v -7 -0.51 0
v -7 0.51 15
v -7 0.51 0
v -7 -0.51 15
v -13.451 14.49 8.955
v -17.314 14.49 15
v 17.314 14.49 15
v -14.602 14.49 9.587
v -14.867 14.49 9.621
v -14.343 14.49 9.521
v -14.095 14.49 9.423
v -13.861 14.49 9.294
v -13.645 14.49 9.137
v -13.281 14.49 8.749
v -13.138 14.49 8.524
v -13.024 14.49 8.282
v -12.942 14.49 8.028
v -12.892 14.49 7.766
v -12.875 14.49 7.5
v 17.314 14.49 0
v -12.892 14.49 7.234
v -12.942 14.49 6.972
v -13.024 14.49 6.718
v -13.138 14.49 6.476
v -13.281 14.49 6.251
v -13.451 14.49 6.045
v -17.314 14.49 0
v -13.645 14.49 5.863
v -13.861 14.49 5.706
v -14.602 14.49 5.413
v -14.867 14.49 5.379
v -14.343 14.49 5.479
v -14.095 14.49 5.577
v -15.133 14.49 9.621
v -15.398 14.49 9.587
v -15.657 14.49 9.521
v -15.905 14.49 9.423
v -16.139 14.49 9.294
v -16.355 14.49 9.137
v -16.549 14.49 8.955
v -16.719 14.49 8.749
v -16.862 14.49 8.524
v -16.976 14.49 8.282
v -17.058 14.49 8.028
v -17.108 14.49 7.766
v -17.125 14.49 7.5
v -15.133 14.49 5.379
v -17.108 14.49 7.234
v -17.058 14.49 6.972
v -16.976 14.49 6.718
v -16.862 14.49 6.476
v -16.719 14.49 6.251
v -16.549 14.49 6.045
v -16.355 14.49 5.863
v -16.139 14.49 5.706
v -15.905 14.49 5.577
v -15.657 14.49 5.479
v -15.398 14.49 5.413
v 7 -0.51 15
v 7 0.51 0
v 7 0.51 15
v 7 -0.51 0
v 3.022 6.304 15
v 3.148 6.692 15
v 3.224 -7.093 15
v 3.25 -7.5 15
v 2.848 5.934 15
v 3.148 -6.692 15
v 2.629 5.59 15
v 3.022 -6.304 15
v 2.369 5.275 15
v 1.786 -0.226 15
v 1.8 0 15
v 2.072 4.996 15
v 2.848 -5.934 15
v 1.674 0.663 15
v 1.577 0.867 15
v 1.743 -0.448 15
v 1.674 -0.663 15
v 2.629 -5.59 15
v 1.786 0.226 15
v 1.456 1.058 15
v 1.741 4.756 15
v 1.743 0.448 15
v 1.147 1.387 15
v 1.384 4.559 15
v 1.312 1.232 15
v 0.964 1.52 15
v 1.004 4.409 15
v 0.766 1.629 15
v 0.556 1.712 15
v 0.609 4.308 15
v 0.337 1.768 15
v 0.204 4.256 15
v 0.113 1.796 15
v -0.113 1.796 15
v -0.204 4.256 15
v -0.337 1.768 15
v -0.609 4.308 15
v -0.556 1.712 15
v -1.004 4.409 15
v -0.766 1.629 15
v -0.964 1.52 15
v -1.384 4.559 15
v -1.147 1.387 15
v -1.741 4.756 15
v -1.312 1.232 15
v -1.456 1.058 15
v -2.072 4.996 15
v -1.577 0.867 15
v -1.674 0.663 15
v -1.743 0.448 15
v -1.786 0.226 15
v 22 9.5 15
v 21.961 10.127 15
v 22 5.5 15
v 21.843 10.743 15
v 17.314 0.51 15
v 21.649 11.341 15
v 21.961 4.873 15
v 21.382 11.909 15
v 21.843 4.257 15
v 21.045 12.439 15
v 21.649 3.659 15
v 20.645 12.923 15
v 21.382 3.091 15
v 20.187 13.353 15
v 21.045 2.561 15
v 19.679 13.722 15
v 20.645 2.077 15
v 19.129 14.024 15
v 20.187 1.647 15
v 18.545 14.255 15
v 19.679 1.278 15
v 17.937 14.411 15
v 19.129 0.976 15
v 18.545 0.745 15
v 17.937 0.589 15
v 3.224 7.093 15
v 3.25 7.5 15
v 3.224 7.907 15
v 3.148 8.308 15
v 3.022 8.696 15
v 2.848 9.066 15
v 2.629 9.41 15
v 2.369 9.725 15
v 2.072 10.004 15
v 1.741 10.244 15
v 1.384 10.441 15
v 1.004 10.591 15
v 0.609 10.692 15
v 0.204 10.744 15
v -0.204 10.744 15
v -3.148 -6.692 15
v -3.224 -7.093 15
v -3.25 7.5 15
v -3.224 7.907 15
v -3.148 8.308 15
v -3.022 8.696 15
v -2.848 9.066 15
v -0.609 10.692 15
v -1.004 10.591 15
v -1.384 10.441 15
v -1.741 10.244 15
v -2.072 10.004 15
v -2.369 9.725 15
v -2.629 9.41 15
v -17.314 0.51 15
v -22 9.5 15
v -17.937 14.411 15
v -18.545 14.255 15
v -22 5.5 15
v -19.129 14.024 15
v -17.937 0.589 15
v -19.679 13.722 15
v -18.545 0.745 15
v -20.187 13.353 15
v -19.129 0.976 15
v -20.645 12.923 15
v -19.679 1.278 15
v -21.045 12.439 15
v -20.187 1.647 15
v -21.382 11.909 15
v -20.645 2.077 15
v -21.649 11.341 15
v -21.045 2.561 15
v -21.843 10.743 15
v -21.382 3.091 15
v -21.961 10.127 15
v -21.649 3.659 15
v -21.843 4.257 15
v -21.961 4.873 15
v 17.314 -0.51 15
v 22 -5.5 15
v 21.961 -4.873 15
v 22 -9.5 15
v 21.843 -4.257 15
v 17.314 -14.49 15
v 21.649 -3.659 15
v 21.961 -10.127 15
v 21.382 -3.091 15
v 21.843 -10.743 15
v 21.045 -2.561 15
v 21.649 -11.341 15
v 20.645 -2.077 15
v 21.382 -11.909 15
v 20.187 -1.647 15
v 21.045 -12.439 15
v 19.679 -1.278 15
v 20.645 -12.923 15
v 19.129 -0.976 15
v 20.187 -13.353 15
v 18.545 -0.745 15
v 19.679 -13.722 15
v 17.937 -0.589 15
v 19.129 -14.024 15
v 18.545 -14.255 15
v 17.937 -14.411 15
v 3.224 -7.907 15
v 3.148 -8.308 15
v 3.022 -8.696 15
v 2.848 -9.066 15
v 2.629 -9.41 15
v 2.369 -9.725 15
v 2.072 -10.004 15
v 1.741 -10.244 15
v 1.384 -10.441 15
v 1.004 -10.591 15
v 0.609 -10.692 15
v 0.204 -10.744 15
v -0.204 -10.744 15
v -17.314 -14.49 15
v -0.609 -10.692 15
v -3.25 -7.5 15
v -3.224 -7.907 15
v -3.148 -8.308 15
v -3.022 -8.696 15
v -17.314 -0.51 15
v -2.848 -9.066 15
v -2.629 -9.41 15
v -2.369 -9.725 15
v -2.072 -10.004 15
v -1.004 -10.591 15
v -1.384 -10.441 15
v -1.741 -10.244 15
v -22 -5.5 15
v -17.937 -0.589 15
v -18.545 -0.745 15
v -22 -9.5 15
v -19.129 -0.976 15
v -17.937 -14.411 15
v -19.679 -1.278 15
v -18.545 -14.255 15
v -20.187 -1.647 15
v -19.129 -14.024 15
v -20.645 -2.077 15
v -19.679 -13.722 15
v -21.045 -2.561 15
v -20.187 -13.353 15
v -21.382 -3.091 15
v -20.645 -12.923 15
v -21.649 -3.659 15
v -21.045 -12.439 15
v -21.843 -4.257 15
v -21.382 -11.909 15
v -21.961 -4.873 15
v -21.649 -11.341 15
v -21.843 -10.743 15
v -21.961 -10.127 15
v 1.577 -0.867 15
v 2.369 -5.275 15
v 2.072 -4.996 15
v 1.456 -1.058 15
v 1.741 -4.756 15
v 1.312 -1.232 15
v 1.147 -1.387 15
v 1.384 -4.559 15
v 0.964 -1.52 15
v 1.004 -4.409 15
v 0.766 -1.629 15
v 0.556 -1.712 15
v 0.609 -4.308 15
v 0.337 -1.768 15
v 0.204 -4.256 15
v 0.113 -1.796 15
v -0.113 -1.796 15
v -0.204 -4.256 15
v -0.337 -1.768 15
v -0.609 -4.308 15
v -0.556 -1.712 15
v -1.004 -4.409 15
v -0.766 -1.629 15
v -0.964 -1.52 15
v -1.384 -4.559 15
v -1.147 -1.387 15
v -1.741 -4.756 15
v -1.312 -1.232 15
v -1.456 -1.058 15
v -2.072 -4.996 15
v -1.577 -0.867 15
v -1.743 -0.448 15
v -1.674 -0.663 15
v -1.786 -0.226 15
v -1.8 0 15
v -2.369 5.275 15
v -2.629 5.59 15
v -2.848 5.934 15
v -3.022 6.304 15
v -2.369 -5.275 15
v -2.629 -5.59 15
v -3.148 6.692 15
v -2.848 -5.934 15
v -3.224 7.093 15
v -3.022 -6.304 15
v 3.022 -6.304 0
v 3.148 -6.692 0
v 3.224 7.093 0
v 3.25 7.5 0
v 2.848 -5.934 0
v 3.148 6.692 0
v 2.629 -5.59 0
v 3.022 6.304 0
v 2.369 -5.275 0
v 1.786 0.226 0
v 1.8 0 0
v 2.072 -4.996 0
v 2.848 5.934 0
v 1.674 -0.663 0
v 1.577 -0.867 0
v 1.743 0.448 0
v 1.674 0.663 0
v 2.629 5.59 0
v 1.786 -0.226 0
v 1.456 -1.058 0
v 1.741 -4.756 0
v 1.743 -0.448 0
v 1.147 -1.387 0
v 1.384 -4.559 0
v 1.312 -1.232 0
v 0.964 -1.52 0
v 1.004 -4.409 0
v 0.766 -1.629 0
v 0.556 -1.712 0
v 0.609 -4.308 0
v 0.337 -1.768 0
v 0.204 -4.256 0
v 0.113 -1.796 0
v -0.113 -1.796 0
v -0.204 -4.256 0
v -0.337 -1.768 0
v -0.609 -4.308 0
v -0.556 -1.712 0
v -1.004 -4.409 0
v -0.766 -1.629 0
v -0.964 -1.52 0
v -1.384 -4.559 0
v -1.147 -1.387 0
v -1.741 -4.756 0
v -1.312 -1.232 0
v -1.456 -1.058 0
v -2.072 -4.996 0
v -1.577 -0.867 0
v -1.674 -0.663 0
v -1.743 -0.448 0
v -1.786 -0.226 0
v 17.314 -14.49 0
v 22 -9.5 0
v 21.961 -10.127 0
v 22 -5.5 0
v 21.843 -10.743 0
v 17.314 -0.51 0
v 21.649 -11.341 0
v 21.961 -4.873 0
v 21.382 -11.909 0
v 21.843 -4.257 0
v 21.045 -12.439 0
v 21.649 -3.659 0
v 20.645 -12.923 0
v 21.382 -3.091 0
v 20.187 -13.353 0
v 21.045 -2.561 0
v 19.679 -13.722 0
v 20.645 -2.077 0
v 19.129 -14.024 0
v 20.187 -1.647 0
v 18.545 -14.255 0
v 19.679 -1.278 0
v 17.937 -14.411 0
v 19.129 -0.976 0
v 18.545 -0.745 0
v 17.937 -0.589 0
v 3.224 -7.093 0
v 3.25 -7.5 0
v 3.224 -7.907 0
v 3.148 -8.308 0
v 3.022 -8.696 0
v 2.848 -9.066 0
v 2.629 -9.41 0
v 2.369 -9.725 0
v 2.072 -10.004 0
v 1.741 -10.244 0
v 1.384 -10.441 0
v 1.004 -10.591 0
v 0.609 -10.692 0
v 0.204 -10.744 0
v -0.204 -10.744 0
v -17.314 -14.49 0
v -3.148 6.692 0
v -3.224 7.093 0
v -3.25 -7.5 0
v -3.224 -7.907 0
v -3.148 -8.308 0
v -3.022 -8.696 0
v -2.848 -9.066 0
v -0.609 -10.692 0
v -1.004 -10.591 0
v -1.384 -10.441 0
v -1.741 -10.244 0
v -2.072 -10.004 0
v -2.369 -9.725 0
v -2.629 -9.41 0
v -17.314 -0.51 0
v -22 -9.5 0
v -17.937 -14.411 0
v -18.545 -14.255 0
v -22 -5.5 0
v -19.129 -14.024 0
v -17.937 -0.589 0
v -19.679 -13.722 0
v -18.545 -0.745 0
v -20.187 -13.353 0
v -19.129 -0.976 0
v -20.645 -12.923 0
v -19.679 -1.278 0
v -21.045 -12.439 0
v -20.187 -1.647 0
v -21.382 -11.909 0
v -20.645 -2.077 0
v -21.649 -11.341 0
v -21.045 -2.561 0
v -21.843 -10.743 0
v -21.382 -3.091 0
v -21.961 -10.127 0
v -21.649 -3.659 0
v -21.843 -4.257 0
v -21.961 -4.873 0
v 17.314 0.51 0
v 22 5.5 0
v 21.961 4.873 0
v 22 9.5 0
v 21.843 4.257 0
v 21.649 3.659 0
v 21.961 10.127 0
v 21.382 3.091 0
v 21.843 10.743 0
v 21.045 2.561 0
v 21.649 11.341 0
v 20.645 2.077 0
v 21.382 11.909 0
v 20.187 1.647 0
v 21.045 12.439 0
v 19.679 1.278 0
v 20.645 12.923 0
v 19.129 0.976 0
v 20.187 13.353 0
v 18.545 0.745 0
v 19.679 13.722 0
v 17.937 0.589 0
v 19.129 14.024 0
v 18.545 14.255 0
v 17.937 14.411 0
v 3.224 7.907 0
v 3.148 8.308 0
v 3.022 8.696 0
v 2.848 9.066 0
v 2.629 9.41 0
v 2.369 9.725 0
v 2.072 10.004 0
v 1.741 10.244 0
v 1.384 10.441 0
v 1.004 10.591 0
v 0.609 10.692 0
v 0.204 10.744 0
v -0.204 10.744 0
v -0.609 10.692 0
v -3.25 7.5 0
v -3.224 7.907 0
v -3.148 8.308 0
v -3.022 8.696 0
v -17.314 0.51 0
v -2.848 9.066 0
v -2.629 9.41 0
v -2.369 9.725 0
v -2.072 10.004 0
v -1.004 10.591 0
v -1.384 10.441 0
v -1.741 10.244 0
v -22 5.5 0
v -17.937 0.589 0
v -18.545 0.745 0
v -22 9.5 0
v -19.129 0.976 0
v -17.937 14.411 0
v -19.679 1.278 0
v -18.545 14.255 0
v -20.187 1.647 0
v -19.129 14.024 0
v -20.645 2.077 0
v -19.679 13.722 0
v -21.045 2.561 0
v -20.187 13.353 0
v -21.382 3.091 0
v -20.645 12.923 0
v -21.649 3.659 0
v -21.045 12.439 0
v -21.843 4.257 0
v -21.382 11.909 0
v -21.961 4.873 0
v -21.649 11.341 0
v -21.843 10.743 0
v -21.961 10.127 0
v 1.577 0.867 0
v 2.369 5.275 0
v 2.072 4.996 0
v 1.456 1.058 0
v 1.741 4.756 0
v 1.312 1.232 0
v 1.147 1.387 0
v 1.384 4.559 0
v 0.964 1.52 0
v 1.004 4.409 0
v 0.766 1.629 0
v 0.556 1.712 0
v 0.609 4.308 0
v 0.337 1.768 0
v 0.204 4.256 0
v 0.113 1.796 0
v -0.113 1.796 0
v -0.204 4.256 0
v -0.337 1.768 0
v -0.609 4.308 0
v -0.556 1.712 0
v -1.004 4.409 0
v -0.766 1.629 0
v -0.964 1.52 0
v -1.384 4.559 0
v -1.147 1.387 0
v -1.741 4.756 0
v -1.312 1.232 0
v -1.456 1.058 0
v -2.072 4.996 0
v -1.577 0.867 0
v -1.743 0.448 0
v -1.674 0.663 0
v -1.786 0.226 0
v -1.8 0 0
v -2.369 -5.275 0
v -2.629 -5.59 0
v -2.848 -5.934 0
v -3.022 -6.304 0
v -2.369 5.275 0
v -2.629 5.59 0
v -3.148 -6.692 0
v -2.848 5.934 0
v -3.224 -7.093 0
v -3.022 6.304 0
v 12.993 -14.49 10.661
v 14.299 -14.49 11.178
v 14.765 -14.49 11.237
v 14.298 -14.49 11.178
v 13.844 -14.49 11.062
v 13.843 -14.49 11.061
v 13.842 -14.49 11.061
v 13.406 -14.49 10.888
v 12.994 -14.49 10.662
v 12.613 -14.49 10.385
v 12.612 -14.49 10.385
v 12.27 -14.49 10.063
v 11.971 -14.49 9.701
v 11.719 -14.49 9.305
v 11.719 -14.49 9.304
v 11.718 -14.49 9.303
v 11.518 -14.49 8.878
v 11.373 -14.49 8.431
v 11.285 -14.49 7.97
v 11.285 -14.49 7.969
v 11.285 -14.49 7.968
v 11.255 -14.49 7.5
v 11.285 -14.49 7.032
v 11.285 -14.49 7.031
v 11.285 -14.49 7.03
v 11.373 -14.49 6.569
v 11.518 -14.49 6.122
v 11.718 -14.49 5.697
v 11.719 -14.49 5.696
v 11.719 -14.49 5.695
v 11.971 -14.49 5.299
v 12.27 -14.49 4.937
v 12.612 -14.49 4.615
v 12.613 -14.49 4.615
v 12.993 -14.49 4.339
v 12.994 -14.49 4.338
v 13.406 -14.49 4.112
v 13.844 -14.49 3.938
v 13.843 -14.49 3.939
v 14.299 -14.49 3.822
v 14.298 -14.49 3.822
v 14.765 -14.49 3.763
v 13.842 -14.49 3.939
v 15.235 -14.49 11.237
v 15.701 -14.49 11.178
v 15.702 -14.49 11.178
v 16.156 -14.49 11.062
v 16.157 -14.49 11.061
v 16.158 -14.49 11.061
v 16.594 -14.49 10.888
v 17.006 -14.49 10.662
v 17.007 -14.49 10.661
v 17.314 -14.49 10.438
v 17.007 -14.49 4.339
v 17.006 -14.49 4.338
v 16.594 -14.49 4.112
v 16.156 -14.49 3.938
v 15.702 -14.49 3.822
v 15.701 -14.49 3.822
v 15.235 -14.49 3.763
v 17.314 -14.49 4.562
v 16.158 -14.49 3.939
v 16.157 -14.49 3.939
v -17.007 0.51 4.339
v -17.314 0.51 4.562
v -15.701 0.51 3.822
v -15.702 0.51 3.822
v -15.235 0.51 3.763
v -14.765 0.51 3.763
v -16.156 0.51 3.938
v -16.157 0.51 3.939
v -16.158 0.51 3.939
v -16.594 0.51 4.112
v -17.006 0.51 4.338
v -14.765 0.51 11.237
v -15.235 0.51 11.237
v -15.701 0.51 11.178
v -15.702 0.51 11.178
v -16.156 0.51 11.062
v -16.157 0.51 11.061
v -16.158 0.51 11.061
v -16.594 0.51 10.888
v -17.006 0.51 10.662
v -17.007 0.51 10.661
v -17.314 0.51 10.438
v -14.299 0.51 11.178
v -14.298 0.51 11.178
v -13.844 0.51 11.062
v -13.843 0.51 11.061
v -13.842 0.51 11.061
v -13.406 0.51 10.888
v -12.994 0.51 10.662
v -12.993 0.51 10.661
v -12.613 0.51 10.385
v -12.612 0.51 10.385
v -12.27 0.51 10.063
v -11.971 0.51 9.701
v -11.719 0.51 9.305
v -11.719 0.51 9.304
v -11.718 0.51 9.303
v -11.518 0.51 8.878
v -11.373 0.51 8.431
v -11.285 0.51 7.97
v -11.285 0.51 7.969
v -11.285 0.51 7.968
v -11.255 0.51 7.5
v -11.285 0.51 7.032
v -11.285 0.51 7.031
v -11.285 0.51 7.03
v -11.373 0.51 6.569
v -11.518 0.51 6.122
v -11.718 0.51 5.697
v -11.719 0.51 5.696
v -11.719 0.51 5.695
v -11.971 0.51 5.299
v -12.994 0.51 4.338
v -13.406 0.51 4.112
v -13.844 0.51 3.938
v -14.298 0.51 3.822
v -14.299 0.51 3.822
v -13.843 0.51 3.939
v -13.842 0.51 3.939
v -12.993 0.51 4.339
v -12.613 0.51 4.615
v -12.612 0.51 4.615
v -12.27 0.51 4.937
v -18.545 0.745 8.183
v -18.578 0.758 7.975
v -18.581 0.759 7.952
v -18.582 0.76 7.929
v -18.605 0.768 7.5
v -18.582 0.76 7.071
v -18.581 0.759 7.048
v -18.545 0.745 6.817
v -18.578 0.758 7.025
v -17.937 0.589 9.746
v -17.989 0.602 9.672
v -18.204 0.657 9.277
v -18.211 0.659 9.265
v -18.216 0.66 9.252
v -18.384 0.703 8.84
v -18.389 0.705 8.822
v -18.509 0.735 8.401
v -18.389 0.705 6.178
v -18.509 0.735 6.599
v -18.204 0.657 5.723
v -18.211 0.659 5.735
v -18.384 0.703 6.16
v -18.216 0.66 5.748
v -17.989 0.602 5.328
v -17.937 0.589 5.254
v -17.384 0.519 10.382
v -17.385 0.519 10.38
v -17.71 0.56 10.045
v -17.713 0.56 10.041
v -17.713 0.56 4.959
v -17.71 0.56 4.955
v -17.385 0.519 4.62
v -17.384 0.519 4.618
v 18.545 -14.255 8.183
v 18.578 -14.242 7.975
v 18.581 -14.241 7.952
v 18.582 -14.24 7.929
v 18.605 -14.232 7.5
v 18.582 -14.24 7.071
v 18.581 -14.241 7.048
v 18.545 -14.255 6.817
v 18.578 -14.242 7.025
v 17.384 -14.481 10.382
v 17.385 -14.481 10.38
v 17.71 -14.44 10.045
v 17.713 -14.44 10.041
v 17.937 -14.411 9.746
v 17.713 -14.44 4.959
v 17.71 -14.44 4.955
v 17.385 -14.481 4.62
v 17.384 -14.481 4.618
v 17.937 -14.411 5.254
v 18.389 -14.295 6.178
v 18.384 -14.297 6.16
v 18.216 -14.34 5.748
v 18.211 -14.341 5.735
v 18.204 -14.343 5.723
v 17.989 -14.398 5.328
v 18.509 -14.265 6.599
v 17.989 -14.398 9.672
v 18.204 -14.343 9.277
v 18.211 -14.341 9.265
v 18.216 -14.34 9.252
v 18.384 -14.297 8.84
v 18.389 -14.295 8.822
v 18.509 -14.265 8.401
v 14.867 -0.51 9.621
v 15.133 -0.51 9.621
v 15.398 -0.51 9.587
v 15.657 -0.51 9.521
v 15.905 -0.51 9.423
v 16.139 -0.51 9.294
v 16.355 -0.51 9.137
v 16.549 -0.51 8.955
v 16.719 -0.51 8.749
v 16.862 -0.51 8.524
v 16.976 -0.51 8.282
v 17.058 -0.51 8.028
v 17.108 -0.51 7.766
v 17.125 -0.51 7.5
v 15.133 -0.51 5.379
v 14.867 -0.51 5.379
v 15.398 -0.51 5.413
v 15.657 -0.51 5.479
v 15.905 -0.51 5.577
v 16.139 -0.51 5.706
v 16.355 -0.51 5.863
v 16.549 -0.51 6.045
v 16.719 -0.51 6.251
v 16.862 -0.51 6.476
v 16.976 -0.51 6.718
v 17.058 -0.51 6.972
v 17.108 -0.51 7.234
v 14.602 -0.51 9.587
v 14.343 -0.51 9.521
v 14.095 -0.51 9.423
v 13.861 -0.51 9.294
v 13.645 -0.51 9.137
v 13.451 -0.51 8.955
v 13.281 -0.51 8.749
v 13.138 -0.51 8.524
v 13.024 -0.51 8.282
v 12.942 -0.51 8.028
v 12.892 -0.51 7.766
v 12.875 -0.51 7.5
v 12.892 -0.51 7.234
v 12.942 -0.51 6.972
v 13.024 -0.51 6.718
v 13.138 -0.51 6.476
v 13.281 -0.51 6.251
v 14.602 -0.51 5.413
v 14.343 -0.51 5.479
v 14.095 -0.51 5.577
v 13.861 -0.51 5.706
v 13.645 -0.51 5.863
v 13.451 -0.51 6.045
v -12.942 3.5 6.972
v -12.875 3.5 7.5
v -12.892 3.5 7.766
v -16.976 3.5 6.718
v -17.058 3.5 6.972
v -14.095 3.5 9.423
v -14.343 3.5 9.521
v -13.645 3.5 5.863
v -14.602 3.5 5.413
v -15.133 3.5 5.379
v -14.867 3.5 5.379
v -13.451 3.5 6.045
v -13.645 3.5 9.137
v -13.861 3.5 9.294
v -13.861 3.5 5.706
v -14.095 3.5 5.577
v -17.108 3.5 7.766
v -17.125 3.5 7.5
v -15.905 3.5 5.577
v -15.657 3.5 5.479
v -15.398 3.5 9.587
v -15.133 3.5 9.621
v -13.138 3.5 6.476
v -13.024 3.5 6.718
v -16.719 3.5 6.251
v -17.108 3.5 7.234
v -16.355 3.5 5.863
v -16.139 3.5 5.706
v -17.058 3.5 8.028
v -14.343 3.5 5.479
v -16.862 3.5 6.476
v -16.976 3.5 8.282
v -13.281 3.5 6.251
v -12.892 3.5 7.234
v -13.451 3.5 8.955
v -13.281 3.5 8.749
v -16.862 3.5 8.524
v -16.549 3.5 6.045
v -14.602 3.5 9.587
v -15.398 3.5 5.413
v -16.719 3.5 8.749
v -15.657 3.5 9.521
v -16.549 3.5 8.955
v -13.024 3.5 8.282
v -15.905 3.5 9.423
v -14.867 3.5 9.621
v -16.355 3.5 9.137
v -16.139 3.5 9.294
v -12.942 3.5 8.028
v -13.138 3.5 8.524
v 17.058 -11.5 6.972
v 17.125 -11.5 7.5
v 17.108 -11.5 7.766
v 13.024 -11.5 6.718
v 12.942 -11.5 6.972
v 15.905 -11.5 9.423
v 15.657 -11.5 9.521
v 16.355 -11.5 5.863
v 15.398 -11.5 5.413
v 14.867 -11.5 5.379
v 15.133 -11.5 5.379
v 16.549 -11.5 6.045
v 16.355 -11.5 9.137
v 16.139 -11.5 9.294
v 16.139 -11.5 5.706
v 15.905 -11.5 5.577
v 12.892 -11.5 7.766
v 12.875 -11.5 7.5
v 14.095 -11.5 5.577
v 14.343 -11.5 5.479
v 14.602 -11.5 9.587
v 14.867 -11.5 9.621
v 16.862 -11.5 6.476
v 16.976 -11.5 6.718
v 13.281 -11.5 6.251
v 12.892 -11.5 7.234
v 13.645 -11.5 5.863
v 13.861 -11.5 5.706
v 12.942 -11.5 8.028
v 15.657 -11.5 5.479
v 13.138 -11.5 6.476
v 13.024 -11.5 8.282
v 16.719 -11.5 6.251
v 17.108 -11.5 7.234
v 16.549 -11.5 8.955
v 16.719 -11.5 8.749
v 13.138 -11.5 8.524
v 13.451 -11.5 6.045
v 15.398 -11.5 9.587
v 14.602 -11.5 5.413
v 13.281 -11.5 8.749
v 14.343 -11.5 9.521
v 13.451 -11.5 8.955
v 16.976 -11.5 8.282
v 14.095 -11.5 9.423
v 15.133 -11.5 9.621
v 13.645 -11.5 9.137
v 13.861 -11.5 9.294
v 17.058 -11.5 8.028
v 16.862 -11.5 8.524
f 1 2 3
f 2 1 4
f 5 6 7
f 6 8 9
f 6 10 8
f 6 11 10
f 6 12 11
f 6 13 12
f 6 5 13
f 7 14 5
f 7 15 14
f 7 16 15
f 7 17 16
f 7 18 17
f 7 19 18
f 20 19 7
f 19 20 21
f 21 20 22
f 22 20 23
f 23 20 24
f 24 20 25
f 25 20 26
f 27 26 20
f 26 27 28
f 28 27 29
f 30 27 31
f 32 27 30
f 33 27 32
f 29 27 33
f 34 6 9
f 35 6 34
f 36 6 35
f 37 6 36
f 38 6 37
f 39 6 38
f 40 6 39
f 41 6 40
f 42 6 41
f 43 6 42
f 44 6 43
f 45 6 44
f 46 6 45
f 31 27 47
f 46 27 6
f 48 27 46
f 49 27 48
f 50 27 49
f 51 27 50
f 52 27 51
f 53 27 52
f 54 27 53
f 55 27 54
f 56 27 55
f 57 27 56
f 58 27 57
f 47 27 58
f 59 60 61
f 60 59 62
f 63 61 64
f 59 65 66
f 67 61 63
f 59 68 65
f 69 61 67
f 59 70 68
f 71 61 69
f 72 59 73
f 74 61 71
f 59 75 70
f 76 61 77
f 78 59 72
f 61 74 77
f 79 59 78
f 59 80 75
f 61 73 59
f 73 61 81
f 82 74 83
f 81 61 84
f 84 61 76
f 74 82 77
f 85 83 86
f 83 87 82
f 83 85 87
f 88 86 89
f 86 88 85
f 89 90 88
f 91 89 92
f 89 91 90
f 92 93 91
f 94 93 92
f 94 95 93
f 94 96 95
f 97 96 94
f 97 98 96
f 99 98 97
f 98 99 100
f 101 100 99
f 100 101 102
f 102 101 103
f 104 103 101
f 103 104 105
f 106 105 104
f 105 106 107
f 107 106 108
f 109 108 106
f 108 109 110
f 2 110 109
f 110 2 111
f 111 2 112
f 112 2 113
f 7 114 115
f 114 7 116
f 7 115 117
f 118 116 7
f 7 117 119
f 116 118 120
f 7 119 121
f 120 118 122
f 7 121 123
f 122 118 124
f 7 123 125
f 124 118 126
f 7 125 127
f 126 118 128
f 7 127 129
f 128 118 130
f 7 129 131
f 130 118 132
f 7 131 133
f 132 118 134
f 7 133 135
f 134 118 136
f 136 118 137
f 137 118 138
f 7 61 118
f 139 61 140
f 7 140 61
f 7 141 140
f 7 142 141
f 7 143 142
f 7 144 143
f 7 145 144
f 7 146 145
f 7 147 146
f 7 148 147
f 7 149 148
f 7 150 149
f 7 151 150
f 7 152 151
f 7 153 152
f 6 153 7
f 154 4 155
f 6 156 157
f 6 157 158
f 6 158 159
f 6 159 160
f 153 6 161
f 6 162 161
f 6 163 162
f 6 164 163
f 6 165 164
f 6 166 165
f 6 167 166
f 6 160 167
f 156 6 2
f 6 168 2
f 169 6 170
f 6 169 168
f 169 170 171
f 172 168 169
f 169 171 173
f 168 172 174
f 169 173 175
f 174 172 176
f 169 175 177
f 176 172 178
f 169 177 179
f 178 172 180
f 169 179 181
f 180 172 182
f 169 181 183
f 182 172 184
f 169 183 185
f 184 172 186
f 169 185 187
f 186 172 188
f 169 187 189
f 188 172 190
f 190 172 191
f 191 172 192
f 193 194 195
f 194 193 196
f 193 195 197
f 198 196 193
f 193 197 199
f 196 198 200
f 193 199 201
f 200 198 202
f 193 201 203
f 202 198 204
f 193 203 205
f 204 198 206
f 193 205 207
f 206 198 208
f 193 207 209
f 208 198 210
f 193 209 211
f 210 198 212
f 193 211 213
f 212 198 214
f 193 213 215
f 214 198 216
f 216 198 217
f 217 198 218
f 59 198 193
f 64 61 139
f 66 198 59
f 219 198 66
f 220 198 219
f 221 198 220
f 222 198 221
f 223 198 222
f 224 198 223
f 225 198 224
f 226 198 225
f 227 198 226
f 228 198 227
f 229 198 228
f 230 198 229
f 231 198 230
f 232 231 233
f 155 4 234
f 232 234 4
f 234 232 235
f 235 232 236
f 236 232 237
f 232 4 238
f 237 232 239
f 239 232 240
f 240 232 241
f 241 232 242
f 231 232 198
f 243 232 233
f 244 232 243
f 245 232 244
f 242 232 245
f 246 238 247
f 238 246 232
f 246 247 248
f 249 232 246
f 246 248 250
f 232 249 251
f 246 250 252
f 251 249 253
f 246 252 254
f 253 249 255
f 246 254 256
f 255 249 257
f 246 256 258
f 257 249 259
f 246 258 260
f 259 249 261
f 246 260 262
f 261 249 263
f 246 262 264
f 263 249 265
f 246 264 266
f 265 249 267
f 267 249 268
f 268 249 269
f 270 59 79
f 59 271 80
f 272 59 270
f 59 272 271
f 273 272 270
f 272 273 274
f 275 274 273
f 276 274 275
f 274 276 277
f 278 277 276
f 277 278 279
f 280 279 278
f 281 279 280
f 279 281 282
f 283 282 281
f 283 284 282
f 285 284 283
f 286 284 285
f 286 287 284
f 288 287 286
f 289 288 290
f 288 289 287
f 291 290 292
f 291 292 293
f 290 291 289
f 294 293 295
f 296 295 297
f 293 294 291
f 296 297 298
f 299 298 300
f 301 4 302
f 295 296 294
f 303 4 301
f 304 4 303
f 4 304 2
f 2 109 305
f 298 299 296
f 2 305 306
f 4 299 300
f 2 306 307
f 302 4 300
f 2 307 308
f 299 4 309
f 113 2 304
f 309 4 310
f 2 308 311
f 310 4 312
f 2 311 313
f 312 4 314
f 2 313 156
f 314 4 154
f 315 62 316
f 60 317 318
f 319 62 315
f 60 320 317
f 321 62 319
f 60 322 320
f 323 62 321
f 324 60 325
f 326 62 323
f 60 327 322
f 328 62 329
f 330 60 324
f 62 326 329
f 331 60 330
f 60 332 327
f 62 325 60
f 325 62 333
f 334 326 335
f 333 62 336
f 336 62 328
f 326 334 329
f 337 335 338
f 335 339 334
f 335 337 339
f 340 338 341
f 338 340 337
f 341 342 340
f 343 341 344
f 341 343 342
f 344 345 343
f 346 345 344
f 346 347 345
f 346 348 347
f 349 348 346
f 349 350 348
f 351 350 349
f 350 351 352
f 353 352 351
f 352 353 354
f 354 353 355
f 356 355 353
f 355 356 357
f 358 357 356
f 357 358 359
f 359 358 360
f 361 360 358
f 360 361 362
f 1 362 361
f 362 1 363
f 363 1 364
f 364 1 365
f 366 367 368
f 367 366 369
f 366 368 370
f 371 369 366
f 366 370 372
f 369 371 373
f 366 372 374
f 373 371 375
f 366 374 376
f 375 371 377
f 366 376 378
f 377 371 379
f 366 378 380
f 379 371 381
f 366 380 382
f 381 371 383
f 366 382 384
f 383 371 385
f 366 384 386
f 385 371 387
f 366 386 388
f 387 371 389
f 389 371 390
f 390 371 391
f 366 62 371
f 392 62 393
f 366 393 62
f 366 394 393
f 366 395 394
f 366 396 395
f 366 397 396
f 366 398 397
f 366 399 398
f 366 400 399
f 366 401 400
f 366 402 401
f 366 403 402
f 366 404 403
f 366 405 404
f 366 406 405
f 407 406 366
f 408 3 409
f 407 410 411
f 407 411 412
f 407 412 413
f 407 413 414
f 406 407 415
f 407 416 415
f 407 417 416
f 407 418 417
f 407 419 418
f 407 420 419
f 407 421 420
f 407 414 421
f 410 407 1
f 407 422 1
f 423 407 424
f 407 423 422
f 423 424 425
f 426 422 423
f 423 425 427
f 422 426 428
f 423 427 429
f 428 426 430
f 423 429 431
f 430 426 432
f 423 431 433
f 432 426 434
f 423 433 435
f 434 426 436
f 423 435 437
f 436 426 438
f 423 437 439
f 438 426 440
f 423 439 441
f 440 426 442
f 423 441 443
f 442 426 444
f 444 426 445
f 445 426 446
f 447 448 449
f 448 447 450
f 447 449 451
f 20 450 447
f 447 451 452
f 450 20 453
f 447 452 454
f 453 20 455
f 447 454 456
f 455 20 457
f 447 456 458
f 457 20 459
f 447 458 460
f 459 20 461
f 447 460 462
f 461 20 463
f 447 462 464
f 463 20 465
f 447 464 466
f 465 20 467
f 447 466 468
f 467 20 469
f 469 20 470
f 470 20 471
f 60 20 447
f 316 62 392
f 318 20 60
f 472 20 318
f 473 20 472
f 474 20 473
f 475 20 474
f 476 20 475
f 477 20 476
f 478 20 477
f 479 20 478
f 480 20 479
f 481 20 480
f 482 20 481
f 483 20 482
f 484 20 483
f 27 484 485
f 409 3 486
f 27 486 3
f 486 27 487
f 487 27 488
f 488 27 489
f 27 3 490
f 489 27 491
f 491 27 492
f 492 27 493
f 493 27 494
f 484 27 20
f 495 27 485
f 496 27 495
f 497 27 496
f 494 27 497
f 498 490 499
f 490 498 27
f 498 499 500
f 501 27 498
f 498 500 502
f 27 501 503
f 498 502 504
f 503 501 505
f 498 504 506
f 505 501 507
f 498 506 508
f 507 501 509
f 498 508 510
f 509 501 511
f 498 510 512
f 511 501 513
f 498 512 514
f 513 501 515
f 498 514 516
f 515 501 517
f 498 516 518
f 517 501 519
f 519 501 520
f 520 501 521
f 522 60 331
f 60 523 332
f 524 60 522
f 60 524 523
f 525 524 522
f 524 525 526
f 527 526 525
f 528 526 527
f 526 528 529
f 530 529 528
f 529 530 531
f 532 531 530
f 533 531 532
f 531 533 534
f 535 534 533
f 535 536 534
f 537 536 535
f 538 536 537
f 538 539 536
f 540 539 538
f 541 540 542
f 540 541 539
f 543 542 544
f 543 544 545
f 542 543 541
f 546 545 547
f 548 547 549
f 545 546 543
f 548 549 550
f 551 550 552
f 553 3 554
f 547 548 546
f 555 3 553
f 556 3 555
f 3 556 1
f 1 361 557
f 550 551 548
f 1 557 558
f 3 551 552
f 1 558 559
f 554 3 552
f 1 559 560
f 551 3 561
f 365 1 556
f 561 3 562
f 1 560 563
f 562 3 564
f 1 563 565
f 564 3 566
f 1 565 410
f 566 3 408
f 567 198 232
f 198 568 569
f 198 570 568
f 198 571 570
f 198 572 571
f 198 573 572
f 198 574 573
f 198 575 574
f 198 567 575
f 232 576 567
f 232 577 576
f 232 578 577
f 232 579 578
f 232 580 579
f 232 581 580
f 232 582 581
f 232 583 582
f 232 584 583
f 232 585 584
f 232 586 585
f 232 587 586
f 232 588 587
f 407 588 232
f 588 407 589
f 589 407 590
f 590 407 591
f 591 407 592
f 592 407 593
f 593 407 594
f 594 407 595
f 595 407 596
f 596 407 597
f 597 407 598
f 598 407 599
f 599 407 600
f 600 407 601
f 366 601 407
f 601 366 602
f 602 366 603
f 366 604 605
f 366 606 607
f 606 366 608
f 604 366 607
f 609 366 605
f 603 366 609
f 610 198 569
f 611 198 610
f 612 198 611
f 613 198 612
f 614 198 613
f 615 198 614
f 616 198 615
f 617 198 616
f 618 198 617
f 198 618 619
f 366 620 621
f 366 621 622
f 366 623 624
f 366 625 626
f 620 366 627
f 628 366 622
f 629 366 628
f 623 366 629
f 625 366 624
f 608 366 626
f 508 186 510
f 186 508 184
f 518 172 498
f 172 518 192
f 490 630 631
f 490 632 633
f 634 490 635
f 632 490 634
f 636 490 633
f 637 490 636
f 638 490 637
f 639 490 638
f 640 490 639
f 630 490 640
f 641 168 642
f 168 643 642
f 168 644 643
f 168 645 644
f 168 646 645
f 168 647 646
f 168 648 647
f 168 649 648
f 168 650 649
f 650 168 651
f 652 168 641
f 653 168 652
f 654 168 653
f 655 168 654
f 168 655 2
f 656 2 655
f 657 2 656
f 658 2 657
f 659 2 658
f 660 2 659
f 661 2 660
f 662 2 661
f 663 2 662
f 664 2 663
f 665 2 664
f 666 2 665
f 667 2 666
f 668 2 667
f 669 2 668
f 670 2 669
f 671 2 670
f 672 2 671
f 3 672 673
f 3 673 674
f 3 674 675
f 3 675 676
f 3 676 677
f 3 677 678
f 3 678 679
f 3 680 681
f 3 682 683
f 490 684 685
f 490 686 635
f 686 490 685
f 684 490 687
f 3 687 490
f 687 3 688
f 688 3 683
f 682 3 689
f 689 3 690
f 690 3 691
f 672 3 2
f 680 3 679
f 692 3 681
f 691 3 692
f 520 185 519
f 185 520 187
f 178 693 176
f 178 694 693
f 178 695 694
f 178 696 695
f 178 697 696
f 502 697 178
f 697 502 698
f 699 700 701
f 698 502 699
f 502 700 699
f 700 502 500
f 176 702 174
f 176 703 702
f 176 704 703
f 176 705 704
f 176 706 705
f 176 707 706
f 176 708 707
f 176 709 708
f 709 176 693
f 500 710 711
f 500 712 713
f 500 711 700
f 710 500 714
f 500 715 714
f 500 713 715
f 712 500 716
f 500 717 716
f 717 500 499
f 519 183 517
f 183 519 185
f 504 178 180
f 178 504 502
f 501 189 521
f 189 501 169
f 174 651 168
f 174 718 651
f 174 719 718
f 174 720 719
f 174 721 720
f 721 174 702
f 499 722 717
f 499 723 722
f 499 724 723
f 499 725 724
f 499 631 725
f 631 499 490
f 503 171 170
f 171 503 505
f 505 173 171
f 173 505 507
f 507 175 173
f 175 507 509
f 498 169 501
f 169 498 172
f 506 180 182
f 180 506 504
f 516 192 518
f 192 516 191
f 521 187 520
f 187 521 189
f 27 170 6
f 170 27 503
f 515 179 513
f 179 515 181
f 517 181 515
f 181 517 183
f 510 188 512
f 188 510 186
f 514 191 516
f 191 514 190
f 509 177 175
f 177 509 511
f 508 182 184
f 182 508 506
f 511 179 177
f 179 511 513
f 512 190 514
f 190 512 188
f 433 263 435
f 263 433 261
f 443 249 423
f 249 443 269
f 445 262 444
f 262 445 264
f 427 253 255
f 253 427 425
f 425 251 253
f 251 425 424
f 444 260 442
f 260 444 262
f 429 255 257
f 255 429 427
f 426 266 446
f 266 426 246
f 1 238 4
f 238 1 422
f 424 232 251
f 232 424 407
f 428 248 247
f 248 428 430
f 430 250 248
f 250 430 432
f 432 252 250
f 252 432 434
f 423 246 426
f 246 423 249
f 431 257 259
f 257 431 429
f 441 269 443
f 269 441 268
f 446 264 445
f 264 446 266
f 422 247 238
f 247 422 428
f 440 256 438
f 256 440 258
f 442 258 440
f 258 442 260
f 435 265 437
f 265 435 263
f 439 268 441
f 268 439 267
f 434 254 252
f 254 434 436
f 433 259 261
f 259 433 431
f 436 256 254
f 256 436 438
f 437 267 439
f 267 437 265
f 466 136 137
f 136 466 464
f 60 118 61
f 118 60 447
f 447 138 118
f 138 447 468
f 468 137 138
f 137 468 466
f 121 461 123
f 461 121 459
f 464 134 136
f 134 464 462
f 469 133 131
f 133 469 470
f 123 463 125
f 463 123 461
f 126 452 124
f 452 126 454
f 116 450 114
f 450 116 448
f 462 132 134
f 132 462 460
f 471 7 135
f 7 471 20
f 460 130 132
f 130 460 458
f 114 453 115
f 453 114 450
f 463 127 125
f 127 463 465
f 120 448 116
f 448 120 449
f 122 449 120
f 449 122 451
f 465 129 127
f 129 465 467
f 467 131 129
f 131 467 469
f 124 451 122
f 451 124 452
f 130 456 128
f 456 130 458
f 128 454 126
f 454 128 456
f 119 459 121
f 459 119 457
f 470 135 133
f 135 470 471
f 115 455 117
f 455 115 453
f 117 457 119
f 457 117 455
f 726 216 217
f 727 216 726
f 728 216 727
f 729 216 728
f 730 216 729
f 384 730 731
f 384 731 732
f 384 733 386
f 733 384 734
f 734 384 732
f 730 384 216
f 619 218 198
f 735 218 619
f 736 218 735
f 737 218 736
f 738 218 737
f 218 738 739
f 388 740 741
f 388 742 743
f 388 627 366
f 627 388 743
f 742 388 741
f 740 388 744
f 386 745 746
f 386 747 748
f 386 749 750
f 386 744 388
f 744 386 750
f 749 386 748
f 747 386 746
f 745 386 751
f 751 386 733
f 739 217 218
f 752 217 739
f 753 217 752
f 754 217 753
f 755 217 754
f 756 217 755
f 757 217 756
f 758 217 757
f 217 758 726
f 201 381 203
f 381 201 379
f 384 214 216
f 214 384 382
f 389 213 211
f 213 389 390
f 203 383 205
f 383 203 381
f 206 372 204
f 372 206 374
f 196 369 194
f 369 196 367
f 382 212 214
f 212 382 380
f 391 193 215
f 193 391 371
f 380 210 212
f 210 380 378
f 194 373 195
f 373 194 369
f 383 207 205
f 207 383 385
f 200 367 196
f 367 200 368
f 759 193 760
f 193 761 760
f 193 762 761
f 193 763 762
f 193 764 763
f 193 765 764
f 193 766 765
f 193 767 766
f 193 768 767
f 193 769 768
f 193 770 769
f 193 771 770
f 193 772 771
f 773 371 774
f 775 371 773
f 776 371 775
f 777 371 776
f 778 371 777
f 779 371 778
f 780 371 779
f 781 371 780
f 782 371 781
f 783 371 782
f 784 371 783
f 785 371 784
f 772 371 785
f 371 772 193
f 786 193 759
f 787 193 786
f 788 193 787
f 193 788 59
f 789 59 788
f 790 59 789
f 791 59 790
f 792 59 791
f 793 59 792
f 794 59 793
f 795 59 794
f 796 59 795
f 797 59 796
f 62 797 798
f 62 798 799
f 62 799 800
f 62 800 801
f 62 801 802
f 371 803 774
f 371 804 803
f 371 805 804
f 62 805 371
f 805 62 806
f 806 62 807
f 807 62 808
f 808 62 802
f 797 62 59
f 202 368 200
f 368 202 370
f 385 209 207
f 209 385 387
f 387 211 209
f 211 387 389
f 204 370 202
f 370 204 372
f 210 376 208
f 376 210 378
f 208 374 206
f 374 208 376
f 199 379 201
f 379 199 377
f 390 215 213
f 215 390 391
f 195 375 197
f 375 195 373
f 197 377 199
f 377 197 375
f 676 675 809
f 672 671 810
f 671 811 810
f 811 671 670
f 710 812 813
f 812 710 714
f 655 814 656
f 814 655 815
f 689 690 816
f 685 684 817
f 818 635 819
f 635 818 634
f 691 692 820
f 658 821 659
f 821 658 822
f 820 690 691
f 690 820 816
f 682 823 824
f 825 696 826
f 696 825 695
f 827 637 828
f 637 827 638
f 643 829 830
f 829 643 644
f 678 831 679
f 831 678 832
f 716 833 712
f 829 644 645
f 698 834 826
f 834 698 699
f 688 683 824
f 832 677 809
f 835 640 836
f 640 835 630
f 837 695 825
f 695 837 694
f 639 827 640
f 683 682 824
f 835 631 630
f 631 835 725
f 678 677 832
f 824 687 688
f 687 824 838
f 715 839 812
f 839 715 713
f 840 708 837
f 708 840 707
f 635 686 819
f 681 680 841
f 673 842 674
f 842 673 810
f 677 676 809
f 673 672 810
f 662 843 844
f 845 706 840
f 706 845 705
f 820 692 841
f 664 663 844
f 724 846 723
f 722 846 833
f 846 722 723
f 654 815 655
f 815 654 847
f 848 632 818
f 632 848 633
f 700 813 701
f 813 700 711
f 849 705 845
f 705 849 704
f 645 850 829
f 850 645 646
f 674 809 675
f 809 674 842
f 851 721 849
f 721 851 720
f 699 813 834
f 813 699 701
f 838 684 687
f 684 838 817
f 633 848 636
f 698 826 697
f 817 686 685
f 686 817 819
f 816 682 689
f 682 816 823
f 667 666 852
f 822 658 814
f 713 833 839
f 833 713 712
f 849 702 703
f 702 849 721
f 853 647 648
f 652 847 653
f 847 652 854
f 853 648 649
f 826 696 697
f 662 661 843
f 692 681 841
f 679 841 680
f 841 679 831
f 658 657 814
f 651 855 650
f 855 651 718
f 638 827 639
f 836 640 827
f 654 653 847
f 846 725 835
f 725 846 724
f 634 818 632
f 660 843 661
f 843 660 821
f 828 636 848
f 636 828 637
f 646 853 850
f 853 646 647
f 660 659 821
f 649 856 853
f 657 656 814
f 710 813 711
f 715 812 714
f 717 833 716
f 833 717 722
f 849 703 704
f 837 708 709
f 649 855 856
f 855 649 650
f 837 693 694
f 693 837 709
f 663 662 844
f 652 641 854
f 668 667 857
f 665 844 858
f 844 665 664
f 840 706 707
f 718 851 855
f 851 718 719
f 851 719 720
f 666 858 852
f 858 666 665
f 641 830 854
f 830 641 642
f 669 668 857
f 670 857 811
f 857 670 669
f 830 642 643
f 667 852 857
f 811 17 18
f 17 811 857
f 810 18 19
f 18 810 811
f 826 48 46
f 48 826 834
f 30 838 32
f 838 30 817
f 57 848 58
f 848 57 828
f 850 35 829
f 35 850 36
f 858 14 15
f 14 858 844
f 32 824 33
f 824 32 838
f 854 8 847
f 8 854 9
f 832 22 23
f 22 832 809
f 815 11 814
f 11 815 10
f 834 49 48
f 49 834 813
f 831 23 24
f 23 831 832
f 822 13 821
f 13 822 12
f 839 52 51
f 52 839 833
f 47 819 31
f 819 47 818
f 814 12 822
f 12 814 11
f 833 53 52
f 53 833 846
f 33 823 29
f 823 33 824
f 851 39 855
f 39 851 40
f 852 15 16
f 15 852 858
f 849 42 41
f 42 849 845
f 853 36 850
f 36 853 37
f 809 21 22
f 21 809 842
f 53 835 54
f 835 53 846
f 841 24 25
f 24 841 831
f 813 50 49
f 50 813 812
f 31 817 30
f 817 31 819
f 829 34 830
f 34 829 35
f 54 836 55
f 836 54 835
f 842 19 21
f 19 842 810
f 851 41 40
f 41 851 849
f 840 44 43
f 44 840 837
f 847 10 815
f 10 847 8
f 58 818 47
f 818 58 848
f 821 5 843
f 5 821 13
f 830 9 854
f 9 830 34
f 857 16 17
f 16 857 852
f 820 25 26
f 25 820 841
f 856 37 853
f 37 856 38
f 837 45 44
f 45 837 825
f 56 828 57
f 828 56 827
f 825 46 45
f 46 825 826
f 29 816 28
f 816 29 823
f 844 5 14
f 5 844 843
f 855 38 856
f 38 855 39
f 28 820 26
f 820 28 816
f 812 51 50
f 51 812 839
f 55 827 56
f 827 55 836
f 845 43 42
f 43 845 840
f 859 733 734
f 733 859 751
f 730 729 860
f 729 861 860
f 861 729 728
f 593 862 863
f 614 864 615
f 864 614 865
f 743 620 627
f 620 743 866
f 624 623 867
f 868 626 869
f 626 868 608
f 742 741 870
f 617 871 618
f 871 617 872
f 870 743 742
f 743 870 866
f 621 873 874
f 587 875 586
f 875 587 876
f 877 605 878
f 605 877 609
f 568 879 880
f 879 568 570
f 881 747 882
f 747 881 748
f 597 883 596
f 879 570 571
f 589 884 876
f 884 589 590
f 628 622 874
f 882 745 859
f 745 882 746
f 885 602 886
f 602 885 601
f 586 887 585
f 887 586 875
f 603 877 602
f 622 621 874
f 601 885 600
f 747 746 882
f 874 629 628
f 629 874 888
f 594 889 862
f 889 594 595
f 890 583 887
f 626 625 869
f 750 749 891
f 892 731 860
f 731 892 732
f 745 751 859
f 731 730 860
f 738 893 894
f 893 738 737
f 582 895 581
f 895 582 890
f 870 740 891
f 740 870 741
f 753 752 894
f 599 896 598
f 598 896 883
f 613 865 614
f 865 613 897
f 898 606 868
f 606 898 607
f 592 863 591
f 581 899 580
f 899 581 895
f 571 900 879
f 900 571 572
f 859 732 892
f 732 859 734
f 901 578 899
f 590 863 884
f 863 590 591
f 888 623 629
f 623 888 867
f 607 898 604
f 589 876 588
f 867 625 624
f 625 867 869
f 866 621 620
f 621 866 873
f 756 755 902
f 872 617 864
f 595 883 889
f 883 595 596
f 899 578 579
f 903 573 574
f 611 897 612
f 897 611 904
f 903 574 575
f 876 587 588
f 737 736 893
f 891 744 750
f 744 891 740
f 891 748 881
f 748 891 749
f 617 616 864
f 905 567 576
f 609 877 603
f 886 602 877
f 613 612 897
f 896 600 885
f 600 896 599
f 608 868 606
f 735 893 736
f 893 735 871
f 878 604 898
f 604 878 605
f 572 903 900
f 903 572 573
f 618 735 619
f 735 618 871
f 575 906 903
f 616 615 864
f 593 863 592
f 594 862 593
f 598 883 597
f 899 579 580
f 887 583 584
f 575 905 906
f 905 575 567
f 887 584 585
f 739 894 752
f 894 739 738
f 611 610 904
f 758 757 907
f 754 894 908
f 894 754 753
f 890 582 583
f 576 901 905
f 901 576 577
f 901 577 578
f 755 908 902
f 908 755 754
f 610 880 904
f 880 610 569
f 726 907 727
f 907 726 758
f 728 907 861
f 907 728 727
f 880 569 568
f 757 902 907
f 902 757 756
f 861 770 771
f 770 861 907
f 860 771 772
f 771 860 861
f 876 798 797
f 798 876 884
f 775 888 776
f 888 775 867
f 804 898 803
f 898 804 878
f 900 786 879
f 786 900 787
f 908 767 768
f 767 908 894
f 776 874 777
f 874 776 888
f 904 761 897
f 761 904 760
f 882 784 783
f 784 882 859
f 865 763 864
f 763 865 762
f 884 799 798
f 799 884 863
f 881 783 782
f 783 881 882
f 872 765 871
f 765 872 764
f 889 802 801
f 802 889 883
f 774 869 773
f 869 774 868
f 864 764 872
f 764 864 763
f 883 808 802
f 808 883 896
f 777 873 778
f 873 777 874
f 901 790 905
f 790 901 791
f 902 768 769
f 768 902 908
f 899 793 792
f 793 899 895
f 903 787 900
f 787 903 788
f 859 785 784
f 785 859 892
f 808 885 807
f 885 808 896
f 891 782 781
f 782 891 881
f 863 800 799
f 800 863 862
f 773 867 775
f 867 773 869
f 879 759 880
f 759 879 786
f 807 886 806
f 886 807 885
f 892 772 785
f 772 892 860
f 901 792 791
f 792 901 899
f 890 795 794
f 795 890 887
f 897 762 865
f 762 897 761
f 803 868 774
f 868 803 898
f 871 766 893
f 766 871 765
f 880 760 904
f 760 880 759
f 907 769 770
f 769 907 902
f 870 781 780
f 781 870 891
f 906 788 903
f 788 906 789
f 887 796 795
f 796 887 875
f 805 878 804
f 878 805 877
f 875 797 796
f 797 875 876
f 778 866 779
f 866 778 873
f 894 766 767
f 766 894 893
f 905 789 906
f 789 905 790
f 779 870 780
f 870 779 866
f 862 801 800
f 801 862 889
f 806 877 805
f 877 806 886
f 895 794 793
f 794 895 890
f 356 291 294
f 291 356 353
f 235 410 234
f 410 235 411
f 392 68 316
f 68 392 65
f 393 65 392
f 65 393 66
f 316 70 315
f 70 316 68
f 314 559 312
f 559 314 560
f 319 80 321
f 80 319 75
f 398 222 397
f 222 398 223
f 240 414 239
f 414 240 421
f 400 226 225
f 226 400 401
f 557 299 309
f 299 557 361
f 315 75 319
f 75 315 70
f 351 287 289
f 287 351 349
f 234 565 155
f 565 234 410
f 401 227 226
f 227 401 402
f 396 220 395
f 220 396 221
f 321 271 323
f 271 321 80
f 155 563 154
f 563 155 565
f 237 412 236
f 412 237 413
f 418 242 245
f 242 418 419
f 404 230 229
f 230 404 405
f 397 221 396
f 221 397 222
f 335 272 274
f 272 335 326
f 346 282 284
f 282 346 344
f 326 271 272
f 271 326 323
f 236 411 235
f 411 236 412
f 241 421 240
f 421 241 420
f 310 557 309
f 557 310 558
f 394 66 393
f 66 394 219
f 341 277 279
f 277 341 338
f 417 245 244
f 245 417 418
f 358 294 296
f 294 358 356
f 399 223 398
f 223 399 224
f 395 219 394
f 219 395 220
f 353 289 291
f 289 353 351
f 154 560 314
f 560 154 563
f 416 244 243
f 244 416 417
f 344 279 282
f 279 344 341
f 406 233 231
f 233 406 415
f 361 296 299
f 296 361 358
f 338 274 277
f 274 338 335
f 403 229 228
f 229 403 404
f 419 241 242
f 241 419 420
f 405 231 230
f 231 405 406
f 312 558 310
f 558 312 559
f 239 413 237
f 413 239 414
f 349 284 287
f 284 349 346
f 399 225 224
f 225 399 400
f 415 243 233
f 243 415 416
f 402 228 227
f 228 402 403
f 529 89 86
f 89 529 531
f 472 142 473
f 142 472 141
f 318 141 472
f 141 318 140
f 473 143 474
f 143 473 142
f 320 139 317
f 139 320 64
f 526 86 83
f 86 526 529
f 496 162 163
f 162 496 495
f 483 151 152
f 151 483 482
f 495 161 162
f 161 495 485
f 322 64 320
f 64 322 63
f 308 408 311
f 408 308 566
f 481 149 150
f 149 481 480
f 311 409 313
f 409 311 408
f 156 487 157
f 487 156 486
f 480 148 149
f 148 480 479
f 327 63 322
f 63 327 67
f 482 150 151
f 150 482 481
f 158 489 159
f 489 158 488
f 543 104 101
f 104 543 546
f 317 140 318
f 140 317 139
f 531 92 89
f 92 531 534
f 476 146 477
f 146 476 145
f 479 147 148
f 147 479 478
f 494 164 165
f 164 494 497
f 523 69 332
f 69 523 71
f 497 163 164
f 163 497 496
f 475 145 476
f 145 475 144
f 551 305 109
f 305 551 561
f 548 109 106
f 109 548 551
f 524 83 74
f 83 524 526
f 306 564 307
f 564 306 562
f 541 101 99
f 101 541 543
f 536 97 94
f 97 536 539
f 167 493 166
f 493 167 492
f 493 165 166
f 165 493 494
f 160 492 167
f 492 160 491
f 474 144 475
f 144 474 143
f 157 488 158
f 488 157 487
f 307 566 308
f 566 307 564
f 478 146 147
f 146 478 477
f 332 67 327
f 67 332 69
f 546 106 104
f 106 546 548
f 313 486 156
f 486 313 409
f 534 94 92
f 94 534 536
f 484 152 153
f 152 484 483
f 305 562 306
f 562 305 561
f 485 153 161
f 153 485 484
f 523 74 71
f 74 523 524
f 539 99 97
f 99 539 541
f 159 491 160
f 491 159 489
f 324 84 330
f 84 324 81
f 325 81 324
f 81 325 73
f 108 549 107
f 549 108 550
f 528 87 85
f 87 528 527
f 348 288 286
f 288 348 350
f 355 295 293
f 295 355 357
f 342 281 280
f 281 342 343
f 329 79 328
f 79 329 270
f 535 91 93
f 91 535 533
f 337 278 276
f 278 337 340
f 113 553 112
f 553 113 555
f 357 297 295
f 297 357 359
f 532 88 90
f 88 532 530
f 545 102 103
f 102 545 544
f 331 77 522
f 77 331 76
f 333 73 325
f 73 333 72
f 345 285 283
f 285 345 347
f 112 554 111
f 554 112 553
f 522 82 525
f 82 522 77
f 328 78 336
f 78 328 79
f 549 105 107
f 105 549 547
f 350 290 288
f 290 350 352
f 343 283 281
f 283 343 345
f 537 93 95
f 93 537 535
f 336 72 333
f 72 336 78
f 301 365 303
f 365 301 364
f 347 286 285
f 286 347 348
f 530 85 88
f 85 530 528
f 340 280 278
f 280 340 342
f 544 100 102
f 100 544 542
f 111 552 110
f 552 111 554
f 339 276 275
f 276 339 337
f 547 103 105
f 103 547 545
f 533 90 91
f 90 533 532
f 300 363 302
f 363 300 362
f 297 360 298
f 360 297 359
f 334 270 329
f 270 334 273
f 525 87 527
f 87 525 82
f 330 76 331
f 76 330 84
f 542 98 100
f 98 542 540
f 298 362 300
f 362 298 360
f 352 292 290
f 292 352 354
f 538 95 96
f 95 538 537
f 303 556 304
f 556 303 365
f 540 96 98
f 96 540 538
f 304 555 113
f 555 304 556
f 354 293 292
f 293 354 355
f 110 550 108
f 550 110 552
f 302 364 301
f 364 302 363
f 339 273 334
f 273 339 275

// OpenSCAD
$fn = 50;


difference() {
	union() {
		hull() {
			translate(v = [-2.0000000000, 9.5000000000, 0]) {
				cylinder(h = 15, r = 5);
			}
			translate(v = [2.0000000000, 9.5000000000, 0]) {
				cylinder(h = 15, r = 5);
			}
			translate(v = [-2.0000000000, -9.5000000000, 0]) {
				cylinder(h = 15, r = 5);
			}
			translate(v = [2.0000000000, -9.5000000000, 0]) {
				cylinder(h = 15, r = 5);
			}
		}
		translate(v = [-7.5000000000, 7.5000000000, 0]) {
			hull() {
				translate(v = [-9.5000000000, 2.0000000000, 0]) {
					cylinder(h = 15, r = 5);
				}
				translate(v = [9.5000000000, 2.0000000000, 0]) {
					cylinder(h = 15, r = 5);
				}
				translate(v = [-9.5000000000, -2.0000000000, 0]) {
					cylinder(h = 15, r = 5);
				}
				translate(v = [9.5000000000, -2.0000000000, 0]) {
					cylinder(h = 15, r = 5);
				}
			}
		}
		translate(v = [-7.5000000000, -7.5000000000, 0]) {
			hull() {
				translate(v = [-9.5000000000, 2.0000000000, 0]) {
					cylinder(h = 15, r = 5);
				}
				translate(v = [9.5000000000, 2.0000000000, 0]) {
					cylinder(h = 15, r = 5);
				}
				translate(v = [-9.5000000000, -2.0000000000, 0]) {
					cylinder(h = 15, r = 5);
				}
				translate(v = [9.5000000000, -2.0000000000, 0]) {
					cylinder(h = 15, r = 5);
				}
			}
		}
		translate(v = [7.5000000000, 7.5000000000, 0]) {
			hull() {
				translate(v = [-9.5000000000, 2.0000000000, 0]) {
					cylinder(h = 15, r = 5);
				}
				translate(v = [9.5000000000, 2.0000000000, 0]) {
					cylinder(h = 15, r = 5);
				}
				translate(v = [-9.5000000000, -2.0000000000, 0]) {
					cylinder(h = 15, r = 5);
				}
				translate(v = [9.5000000000, -2.0000000000, 0]) {
					cylinder(h = 15, r = 5);
				}
			}
		}
		translate(v = [7.5000000000, -7.5000000000, 0]) {
			hull() {
				translate(v = [-9.5000000000, 2.0000000000, 0]) {
					cylinder(h = 15, r = 5);
				}
				translate(v = [9.5000000000, 2.0000000000, 0]) {
					cylinder(h = 15, r = 5);
				}
				translate(v = [-9.5000000000, -2.0000000000, 0]) {
					cylinder(h = 15, r = 5);
				}
				translate(v = [9.5000000000, -2.0000000000, 0]) {
					cylinder(h = 15, r = 5);
				}
			}
		}
	}
	union() {
		translate(v = [-15.0000000000, 0.5000000000, 7.5000000000]) {
			rotate(a = [90, 0, 0]) {
				difference() {
					union() {
						#translate(v = [0, 0, -14.0000000000]) {
							cylinder(h = 14, r = 2.0000000000);
						}
						#translate(v = [0, 0, -3]) {
							cylinder(h = 3, r1 = 2.1250000000, r2 = 3.7500000000);
						}
						#translate(v = [0, 0, -14.0000000000]) {
							cylinder(h = 14, r = 2.1250000000);
						}
						#translate(v = [0, 0, -14.0000000000]) {
							cylinder(h = 14, r = 2.0000000000);
						}
					}
					union();
				}
			}
		}
		translate(v = [15.0000000000, -14.5000000000, 7.5000000000]) {
			rotate(a = [90, 0, 0]) {
				difference() {
					union() {
						#translate(v = [0, 0, -14.0000000000]) {
							cylinder(h = 14, r = 2.0000000000);
						}
						#translate(v = [0, 0, -3]) {
							cylinder(h = 3, r1 = 2.1250000000, r2 = 3.7500000000);
						}
						#translate(v = [0, 0, -14.0000000000]) {
							cylinder(h = 14, r = 2.1250000000);
						}
						#translate(v = [0, 0, -14.0000000000]) {
							cylinder(h = 14, r = 2.0000000000);
						}
					}
					union();
				}
			}
		}
		translate(v = [0.0000000000, -7.5000000000, 0]) {
			translate(v = [0, 0, -100]) {
				cylinder(h = 200, r = 3.2500000000);
			}
		}
		translate(v = [0.0000000000, 7.5000000000, 0]) {
			translate(v = [0, 0, -100]) {
				cylinder(h = 200, r = 3.2500000000);
			}
		}
		translate(v = [0.0000000000, -7.5000000000, 0]) {
			translate(v = [0, 0, -100]) {
				cylinder(h = 200, r = 1.8000000000);
			}
		}
		translate(v = [0, 0, -100]) {
			cylinder(h = 200, r = 1.8000000000);
		}
		translate(v = [0.0000000000, 7.5000000000, 0]) {
			translate(v = [0, 0, -100]) {
				cylinder(h = 200, r = 1.8000000000);
			}
		}
	}
}
